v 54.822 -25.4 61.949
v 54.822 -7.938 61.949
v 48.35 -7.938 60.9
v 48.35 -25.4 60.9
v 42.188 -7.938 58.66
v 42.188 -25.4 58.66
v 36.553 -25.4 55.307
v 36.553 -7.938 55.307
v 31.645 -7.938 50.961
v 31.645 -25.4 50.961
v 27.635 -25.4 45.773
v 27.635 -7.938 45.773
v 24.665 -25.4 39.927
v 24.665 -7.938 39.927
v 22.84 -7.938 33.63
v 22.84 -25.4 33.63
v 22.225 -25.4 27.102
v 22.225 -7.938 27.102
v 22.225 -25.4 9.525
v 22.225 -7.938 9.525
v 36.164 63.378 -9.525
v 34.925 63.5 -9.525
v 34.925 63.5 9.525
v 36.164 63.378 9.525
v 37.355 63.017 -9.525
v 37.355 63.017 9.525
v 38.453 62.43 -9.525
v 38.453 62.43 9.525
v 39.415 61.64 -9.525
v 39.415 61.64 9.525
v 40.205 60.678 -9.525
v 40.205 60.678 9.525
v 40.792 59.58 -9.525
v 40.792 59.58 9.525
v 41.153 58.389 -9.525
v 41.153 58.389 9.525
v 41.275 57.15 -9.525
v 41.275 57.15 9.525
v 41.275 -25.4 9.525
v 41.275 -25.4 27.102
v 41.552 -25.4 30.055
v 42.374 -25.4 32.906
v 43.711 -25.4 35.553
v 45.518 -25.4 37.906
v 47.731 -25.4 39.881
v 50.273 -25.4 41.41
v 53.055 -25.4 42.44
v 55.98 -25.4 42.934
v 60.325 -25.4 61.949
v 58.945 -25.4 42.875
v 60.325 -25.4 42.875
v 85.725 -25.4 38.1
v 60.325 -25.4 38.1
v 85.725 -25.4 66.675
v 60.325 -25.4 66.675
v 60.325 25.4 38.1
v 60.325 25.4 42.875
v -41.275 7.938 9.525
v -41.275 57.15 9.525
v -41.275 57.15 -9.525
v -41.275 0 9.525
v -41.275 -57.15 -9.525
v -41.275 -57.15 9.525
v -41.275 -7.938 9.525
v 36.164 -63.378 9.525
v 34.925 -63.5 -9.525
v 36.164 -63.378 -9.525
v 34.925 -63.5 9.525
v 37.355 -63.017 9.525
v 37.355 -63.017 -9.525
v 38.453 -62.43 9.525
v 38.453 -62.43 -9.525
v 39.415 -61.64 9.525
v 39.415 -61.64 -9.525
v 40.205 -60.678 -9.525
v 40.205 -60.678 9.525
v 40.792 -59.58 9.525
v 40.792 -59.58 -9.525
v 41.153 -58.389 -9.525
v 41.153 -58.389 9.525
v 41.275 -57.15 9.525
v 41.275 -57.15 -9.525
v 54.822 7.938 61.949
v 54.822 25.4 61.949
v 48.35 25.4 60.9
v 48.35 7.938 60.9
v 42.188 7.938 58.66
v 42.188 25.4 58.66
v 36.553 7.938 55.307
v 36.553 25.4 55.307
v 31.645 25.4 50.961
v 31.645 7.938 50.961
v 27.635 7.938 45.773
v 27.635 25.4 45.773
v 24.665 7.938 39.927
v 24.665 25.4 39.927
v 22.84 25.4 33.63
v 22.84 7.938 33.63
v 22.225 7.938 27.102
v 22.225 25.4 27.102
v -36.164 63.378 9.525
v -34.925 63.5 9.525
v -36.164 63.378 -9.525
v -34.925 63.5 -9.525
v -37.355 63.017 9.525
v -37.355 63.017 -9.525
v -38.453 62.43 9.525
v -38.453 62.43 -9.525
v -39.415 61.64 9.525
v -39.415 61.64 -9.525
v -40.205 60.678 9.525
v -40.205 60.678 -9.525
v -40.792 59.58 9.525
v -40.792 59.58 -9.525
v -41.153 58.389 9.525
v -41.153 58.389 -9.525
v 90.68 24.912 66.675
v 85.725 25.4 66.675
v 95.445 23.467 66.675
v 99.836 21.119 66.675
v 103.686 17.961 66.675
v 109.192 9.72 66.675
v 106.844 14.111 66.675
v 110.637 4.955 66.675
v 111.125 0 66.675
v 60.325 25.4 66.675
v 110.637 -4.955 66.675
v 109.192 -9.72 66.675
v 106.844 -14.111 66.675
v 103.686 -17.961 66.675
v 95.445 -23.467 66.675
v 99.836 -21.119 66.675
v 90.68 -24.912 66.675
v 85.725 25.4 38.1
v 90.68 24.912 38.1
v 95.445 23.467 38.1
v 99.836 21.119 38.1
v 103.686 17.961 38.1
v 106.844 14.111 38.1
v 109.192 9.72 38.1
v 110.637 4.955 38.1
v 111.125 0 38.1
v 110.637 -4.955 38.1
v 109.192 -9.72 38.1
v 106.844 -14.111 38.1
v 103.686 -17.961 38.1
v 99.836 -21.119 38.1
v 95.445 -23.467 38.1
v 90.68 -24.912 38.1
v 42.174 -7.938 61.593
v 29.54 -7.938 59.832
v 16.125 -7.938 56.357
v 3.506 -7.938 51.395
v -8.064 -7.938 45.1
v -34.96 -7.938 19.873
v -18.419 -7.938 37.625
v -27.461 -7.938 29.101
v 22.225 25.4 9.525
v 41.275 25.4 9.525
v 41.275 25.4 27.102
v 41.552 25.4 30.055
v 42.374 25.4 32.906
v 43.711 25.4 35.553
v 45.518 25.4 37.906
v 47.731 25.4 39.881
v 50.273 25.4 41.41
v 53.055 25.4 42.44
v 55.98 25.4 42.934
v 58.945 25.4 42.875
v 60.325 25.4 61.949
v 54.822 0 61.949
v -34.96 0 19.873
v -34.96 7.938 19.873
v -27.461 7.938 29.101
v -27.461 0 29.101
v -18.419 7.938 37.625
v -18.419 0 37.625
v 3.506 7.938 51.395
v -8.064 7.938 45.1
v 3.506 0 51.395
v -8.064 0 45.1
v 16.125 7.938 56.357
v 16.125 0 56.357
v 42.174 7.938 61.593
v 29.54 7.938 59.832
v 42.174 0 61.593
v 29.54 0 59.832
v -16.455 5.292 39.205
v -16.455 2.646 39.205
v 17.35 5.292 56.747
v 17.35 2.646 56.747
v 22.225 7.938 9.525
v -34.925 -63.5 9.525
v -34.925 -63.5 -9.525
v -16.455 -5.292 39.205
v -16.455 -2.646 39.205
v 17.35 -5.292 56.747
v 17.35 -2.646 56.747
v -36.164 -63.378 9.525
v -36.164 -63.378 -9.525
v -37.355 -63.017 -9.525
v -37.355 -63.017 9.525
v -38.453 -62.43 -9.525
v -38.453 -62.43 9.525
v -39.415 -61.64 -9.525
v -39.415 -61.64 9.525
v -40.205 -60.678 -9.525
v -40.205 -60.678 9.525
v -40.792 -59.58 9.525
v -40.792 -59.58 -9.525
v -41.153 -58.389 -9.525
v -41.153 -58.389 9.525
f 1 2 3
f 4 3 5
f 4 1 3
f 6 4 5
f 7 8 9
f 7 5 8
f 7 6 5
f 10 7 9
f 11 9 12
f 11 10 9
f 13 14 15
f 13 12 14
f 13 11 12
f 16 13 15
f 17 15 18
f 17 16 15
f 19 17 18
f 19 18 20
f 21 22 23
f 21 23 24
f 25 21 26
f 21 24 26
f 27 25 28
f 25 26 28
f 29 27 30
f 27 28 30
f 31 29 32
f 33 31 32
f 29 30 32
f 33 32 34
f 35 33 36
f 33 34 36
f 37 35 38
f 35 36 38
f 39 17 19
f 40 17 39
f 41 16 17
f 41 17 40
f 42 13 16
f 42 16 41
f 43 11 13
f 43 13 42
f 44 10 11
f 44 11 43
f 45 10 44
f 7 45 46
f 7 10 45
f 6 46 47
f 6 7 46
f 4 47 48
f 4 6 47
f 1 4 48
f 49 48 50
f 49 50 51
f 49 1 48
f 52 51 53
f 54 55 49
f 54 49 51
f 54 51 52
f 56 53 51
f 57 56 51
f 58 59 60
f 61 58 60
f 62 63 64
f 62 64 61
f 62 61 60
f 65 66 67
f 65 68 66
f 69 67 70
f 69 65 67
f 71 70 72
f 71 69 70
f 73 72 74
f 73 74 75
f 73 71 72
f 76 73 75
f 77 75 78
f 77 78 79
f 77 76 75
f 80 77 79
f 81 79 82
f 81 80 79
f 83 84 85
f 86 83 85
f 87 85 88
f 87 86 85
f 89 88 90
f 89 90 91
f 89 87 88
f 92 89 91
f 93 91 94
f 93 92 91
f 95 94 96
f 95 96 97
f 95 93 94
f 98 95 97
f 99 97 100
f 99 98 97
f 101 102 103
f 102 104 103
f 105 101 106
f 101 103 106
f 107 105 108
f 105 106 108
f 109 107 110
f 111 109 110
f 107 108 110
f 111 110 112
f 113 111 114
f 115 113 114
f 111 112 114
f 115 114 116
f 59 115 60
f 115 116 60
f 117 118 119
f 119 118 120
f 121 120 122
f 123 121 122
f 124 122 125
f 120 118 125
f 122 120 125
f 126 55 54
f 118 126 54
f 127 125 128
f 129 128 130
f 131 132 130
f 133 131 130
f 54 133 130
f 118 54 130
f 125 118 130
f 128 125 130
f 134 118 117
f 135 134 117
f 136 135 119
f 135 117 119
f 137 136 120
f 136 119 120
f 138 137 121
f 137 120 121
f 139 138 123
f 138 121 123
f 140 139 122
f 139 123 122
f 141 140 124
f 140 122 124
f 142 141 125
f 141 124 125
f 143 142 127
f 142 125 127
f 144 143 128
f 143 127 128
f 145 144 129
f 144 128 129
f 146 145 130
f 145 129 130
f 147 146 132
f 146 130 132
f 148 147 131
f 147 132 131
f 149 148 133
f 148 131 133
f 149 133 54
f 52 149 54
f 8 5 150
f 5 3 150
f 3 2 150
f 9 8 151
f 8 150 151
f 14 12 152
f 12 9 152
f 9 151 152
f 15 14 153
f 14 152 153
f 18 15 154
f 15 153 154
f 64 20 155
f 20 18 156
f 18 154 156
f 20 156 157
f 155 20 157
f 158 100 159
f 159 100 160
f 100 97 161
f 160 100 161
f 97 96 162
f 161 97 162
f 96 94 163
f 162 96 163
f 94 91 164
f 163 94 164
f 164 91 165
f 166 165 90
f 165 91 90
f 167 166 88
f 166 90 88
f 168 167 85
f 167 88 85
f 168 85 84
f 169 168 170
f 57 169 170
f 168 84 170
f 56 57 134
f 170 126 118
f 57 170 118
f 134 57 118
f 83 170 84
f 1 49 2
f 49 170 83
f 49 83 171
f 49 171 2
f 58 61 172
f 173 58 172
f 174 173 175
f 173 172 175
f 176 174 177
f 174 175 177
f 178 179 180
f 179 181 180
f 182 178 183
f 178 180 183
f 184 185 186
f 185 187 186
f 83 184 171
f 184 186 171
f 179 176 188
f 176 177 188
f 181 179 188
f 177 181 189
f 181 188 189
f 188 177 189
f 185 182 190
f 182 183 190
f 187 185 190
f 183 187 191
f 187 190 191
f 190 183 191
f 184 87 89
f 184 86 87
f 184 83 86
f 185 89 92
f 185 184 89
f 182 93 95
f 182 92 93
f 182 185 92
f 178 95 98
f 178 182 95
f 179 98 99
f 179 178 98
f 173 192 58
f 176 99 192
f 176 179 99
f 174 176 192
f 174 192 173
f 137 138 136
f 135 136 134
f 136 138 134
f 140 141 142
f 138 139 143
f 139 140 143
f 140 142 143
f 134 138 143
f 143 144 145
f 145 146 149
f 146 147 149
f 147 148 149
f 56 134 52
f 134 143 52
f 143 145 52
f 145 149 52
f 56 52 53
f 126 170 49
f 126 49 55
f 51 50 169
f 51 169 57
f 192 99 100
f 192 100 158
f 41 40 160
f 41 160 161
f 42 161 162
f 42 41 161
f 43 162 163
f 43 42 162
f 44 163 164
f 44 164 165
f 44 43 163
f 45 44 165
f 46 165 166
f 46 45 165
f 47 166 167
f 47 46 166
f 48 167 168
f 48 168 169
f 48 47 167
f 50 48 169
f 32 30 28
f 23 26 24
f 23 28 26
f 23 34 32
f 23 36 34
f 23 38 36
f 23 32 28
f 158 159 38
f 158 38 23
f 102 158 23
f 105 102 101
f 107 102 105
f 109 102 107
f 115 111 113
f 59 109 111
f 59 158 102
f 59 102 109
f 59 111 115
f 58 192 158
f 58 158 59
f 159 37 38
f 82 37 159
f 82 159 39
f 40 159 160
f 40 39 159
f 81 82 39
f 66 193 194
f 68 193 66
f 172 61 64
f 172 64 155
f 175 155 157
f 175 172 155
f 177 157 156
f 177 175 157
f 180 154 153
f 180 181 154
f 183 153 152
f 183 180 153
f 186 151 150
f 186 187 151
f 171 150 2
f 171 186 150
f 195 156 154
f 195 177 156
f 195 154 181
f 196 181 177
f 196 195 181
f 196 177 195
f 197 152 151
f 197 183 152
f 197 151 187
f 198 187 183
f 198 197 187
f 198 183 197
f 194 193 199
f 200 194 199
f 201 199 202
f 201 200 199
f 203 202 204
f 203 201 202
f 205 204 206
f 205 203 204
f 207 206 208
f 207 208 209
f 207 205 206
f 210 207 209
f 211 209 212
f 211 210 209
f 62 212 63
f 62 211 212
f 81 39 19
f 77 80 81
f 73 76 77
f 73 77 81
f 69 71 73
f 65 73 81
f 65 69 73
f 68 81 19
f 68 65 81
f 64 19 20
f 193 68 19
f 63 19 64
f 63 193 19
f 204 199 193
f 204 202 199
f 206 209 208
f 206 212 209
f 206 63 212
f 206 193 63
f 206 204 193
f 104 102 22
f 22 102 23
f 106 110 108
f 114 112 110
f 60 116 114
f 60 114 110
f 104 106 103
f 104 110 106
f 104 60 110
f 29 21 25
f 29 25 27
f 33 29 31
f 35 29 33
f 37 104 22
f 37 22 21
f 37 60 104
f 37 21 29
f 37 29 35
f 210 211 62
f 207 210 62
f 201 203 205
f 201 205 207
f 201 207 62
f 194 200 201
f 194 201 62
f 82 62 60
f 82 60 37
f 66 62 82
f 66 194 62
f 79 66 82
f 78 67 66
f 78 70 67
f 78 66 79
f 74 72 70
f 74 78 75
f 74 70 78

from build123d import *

# Parameters (mm, degrees)
F1_DEPTH = 63.5
F0_W     = 25.4
F0_H     = 4.7752
F0_H_2   = 4.7256098347
F0_H_3   = 19.0741901653
F2_DEPTH = 25.4
F3_DEPTH = 7.9375
F5_R     = 6.35


with BuildPart() as f1:
    # F0 (on Front) → F1 (new body, symmetric)
    with BuildSketch(Plane.XZ):
        Polygon((-41.275, 9.525), (-41.275, -9.525), (41.275, -9.525), (41.275, 9.525), (22.225, 9.525), align=None)
    extrude(amount=F1_DEPTH, both=True)

    # F0 (on Front) → F2 (join, symmetric)
    with BuildSketch(Plane.XZ):
        Polygon((-41.275, 9.525), (-41.275, -9.525), (41.275, -9.525), (41.275, 9.525), (22.225, 9.525), align=None)
        with Locations((73.025, 40.4876)):
            Rectangle(F0_W, F0_H)
        with Locations((73.025, 64.3121950827)):
            Rectangle(F0_W, F0_H_2)
        with BuildLine():
            Line((22.225, 9.525), (41.275, 9.525))
            Line((41.275, 9.525), (41.275, 27.1020599752))
            ThreePointArc((41.275, 27.1020599752), (46.5785126871, 38.9451710949), (58.9454605977, 42.8752))
            Line((58.9454605977, 42.8752), (60.325, 42.8752))
            Line((60.325, 42.8752), (60.325, 61.9493901653))
            Line((60.325, 61.9493901653), (54.8220816984, 61.9493901653))
            ThreePointArc((54.8220816984, 61.9493901653), (31.6445283156, 50.9605288942), (22.225, 27.1020599752))
            Line((22.225, 27.1020599752), (22.225, 9.525))
        make_face()
        with Locations((73.025, 52.4122950827)):
            Rectangle(F0_W, F0_H_3)
    extrude(amount=F2_DEPTH, both=True)

    # F0 (on Front) → F3 (join, symmetric)
    with BuildSketch(Plane.XZ):
        with BuildLine():
            add(Edge.make_bspline(
                [(-41.275, 9.525), (-22.719591856, 45.2046655118), (17.2888338566, 62.9861876369), (54.8220816984, 61.9493901653)],
                knots=[0, 0, 0, 0, 109.4667337375, 109.4667337375, 109.4667337375, 109.4667337375], degree=3))
            Line((-41.275, 9.525), (22.225, 9.525))
            Line((22.225, 9.525), (22.225, 27.1020599752))
            ThreePointArc((22.225, 27.1020599752), (31.6445283156, 50.9605288942), (54.8220816984, 61.9493901653))
        make_face()
    extrude(amount=F3_DEPTH, both=True)

    # F0 (on Front) → F4 (revolve)
    with BuildSketch(Plane.XZ):
        Polygon((85.725, 66.675), (85.725, 61.9493901653), (85.725, 42.8752), (85.725, 38.1), (111.125, 38.1), (111.125, 66.675), align=None)
    revolve(axis=Axis((85.725, 0, 52.3875), (0, 0, -1)))

    # F5
    f5_edges = [f1.edges().sort_by_distance(p)[0] for p in [
        (41.275, -63.5, 0),
        (-41.275, -63.5, 0),
        (-41.275, 63.5, 0),
        (41.275, 63.5, 0),
    ]]
    fillet(f5_edges, radius=F5_R)


solid = f1.part
